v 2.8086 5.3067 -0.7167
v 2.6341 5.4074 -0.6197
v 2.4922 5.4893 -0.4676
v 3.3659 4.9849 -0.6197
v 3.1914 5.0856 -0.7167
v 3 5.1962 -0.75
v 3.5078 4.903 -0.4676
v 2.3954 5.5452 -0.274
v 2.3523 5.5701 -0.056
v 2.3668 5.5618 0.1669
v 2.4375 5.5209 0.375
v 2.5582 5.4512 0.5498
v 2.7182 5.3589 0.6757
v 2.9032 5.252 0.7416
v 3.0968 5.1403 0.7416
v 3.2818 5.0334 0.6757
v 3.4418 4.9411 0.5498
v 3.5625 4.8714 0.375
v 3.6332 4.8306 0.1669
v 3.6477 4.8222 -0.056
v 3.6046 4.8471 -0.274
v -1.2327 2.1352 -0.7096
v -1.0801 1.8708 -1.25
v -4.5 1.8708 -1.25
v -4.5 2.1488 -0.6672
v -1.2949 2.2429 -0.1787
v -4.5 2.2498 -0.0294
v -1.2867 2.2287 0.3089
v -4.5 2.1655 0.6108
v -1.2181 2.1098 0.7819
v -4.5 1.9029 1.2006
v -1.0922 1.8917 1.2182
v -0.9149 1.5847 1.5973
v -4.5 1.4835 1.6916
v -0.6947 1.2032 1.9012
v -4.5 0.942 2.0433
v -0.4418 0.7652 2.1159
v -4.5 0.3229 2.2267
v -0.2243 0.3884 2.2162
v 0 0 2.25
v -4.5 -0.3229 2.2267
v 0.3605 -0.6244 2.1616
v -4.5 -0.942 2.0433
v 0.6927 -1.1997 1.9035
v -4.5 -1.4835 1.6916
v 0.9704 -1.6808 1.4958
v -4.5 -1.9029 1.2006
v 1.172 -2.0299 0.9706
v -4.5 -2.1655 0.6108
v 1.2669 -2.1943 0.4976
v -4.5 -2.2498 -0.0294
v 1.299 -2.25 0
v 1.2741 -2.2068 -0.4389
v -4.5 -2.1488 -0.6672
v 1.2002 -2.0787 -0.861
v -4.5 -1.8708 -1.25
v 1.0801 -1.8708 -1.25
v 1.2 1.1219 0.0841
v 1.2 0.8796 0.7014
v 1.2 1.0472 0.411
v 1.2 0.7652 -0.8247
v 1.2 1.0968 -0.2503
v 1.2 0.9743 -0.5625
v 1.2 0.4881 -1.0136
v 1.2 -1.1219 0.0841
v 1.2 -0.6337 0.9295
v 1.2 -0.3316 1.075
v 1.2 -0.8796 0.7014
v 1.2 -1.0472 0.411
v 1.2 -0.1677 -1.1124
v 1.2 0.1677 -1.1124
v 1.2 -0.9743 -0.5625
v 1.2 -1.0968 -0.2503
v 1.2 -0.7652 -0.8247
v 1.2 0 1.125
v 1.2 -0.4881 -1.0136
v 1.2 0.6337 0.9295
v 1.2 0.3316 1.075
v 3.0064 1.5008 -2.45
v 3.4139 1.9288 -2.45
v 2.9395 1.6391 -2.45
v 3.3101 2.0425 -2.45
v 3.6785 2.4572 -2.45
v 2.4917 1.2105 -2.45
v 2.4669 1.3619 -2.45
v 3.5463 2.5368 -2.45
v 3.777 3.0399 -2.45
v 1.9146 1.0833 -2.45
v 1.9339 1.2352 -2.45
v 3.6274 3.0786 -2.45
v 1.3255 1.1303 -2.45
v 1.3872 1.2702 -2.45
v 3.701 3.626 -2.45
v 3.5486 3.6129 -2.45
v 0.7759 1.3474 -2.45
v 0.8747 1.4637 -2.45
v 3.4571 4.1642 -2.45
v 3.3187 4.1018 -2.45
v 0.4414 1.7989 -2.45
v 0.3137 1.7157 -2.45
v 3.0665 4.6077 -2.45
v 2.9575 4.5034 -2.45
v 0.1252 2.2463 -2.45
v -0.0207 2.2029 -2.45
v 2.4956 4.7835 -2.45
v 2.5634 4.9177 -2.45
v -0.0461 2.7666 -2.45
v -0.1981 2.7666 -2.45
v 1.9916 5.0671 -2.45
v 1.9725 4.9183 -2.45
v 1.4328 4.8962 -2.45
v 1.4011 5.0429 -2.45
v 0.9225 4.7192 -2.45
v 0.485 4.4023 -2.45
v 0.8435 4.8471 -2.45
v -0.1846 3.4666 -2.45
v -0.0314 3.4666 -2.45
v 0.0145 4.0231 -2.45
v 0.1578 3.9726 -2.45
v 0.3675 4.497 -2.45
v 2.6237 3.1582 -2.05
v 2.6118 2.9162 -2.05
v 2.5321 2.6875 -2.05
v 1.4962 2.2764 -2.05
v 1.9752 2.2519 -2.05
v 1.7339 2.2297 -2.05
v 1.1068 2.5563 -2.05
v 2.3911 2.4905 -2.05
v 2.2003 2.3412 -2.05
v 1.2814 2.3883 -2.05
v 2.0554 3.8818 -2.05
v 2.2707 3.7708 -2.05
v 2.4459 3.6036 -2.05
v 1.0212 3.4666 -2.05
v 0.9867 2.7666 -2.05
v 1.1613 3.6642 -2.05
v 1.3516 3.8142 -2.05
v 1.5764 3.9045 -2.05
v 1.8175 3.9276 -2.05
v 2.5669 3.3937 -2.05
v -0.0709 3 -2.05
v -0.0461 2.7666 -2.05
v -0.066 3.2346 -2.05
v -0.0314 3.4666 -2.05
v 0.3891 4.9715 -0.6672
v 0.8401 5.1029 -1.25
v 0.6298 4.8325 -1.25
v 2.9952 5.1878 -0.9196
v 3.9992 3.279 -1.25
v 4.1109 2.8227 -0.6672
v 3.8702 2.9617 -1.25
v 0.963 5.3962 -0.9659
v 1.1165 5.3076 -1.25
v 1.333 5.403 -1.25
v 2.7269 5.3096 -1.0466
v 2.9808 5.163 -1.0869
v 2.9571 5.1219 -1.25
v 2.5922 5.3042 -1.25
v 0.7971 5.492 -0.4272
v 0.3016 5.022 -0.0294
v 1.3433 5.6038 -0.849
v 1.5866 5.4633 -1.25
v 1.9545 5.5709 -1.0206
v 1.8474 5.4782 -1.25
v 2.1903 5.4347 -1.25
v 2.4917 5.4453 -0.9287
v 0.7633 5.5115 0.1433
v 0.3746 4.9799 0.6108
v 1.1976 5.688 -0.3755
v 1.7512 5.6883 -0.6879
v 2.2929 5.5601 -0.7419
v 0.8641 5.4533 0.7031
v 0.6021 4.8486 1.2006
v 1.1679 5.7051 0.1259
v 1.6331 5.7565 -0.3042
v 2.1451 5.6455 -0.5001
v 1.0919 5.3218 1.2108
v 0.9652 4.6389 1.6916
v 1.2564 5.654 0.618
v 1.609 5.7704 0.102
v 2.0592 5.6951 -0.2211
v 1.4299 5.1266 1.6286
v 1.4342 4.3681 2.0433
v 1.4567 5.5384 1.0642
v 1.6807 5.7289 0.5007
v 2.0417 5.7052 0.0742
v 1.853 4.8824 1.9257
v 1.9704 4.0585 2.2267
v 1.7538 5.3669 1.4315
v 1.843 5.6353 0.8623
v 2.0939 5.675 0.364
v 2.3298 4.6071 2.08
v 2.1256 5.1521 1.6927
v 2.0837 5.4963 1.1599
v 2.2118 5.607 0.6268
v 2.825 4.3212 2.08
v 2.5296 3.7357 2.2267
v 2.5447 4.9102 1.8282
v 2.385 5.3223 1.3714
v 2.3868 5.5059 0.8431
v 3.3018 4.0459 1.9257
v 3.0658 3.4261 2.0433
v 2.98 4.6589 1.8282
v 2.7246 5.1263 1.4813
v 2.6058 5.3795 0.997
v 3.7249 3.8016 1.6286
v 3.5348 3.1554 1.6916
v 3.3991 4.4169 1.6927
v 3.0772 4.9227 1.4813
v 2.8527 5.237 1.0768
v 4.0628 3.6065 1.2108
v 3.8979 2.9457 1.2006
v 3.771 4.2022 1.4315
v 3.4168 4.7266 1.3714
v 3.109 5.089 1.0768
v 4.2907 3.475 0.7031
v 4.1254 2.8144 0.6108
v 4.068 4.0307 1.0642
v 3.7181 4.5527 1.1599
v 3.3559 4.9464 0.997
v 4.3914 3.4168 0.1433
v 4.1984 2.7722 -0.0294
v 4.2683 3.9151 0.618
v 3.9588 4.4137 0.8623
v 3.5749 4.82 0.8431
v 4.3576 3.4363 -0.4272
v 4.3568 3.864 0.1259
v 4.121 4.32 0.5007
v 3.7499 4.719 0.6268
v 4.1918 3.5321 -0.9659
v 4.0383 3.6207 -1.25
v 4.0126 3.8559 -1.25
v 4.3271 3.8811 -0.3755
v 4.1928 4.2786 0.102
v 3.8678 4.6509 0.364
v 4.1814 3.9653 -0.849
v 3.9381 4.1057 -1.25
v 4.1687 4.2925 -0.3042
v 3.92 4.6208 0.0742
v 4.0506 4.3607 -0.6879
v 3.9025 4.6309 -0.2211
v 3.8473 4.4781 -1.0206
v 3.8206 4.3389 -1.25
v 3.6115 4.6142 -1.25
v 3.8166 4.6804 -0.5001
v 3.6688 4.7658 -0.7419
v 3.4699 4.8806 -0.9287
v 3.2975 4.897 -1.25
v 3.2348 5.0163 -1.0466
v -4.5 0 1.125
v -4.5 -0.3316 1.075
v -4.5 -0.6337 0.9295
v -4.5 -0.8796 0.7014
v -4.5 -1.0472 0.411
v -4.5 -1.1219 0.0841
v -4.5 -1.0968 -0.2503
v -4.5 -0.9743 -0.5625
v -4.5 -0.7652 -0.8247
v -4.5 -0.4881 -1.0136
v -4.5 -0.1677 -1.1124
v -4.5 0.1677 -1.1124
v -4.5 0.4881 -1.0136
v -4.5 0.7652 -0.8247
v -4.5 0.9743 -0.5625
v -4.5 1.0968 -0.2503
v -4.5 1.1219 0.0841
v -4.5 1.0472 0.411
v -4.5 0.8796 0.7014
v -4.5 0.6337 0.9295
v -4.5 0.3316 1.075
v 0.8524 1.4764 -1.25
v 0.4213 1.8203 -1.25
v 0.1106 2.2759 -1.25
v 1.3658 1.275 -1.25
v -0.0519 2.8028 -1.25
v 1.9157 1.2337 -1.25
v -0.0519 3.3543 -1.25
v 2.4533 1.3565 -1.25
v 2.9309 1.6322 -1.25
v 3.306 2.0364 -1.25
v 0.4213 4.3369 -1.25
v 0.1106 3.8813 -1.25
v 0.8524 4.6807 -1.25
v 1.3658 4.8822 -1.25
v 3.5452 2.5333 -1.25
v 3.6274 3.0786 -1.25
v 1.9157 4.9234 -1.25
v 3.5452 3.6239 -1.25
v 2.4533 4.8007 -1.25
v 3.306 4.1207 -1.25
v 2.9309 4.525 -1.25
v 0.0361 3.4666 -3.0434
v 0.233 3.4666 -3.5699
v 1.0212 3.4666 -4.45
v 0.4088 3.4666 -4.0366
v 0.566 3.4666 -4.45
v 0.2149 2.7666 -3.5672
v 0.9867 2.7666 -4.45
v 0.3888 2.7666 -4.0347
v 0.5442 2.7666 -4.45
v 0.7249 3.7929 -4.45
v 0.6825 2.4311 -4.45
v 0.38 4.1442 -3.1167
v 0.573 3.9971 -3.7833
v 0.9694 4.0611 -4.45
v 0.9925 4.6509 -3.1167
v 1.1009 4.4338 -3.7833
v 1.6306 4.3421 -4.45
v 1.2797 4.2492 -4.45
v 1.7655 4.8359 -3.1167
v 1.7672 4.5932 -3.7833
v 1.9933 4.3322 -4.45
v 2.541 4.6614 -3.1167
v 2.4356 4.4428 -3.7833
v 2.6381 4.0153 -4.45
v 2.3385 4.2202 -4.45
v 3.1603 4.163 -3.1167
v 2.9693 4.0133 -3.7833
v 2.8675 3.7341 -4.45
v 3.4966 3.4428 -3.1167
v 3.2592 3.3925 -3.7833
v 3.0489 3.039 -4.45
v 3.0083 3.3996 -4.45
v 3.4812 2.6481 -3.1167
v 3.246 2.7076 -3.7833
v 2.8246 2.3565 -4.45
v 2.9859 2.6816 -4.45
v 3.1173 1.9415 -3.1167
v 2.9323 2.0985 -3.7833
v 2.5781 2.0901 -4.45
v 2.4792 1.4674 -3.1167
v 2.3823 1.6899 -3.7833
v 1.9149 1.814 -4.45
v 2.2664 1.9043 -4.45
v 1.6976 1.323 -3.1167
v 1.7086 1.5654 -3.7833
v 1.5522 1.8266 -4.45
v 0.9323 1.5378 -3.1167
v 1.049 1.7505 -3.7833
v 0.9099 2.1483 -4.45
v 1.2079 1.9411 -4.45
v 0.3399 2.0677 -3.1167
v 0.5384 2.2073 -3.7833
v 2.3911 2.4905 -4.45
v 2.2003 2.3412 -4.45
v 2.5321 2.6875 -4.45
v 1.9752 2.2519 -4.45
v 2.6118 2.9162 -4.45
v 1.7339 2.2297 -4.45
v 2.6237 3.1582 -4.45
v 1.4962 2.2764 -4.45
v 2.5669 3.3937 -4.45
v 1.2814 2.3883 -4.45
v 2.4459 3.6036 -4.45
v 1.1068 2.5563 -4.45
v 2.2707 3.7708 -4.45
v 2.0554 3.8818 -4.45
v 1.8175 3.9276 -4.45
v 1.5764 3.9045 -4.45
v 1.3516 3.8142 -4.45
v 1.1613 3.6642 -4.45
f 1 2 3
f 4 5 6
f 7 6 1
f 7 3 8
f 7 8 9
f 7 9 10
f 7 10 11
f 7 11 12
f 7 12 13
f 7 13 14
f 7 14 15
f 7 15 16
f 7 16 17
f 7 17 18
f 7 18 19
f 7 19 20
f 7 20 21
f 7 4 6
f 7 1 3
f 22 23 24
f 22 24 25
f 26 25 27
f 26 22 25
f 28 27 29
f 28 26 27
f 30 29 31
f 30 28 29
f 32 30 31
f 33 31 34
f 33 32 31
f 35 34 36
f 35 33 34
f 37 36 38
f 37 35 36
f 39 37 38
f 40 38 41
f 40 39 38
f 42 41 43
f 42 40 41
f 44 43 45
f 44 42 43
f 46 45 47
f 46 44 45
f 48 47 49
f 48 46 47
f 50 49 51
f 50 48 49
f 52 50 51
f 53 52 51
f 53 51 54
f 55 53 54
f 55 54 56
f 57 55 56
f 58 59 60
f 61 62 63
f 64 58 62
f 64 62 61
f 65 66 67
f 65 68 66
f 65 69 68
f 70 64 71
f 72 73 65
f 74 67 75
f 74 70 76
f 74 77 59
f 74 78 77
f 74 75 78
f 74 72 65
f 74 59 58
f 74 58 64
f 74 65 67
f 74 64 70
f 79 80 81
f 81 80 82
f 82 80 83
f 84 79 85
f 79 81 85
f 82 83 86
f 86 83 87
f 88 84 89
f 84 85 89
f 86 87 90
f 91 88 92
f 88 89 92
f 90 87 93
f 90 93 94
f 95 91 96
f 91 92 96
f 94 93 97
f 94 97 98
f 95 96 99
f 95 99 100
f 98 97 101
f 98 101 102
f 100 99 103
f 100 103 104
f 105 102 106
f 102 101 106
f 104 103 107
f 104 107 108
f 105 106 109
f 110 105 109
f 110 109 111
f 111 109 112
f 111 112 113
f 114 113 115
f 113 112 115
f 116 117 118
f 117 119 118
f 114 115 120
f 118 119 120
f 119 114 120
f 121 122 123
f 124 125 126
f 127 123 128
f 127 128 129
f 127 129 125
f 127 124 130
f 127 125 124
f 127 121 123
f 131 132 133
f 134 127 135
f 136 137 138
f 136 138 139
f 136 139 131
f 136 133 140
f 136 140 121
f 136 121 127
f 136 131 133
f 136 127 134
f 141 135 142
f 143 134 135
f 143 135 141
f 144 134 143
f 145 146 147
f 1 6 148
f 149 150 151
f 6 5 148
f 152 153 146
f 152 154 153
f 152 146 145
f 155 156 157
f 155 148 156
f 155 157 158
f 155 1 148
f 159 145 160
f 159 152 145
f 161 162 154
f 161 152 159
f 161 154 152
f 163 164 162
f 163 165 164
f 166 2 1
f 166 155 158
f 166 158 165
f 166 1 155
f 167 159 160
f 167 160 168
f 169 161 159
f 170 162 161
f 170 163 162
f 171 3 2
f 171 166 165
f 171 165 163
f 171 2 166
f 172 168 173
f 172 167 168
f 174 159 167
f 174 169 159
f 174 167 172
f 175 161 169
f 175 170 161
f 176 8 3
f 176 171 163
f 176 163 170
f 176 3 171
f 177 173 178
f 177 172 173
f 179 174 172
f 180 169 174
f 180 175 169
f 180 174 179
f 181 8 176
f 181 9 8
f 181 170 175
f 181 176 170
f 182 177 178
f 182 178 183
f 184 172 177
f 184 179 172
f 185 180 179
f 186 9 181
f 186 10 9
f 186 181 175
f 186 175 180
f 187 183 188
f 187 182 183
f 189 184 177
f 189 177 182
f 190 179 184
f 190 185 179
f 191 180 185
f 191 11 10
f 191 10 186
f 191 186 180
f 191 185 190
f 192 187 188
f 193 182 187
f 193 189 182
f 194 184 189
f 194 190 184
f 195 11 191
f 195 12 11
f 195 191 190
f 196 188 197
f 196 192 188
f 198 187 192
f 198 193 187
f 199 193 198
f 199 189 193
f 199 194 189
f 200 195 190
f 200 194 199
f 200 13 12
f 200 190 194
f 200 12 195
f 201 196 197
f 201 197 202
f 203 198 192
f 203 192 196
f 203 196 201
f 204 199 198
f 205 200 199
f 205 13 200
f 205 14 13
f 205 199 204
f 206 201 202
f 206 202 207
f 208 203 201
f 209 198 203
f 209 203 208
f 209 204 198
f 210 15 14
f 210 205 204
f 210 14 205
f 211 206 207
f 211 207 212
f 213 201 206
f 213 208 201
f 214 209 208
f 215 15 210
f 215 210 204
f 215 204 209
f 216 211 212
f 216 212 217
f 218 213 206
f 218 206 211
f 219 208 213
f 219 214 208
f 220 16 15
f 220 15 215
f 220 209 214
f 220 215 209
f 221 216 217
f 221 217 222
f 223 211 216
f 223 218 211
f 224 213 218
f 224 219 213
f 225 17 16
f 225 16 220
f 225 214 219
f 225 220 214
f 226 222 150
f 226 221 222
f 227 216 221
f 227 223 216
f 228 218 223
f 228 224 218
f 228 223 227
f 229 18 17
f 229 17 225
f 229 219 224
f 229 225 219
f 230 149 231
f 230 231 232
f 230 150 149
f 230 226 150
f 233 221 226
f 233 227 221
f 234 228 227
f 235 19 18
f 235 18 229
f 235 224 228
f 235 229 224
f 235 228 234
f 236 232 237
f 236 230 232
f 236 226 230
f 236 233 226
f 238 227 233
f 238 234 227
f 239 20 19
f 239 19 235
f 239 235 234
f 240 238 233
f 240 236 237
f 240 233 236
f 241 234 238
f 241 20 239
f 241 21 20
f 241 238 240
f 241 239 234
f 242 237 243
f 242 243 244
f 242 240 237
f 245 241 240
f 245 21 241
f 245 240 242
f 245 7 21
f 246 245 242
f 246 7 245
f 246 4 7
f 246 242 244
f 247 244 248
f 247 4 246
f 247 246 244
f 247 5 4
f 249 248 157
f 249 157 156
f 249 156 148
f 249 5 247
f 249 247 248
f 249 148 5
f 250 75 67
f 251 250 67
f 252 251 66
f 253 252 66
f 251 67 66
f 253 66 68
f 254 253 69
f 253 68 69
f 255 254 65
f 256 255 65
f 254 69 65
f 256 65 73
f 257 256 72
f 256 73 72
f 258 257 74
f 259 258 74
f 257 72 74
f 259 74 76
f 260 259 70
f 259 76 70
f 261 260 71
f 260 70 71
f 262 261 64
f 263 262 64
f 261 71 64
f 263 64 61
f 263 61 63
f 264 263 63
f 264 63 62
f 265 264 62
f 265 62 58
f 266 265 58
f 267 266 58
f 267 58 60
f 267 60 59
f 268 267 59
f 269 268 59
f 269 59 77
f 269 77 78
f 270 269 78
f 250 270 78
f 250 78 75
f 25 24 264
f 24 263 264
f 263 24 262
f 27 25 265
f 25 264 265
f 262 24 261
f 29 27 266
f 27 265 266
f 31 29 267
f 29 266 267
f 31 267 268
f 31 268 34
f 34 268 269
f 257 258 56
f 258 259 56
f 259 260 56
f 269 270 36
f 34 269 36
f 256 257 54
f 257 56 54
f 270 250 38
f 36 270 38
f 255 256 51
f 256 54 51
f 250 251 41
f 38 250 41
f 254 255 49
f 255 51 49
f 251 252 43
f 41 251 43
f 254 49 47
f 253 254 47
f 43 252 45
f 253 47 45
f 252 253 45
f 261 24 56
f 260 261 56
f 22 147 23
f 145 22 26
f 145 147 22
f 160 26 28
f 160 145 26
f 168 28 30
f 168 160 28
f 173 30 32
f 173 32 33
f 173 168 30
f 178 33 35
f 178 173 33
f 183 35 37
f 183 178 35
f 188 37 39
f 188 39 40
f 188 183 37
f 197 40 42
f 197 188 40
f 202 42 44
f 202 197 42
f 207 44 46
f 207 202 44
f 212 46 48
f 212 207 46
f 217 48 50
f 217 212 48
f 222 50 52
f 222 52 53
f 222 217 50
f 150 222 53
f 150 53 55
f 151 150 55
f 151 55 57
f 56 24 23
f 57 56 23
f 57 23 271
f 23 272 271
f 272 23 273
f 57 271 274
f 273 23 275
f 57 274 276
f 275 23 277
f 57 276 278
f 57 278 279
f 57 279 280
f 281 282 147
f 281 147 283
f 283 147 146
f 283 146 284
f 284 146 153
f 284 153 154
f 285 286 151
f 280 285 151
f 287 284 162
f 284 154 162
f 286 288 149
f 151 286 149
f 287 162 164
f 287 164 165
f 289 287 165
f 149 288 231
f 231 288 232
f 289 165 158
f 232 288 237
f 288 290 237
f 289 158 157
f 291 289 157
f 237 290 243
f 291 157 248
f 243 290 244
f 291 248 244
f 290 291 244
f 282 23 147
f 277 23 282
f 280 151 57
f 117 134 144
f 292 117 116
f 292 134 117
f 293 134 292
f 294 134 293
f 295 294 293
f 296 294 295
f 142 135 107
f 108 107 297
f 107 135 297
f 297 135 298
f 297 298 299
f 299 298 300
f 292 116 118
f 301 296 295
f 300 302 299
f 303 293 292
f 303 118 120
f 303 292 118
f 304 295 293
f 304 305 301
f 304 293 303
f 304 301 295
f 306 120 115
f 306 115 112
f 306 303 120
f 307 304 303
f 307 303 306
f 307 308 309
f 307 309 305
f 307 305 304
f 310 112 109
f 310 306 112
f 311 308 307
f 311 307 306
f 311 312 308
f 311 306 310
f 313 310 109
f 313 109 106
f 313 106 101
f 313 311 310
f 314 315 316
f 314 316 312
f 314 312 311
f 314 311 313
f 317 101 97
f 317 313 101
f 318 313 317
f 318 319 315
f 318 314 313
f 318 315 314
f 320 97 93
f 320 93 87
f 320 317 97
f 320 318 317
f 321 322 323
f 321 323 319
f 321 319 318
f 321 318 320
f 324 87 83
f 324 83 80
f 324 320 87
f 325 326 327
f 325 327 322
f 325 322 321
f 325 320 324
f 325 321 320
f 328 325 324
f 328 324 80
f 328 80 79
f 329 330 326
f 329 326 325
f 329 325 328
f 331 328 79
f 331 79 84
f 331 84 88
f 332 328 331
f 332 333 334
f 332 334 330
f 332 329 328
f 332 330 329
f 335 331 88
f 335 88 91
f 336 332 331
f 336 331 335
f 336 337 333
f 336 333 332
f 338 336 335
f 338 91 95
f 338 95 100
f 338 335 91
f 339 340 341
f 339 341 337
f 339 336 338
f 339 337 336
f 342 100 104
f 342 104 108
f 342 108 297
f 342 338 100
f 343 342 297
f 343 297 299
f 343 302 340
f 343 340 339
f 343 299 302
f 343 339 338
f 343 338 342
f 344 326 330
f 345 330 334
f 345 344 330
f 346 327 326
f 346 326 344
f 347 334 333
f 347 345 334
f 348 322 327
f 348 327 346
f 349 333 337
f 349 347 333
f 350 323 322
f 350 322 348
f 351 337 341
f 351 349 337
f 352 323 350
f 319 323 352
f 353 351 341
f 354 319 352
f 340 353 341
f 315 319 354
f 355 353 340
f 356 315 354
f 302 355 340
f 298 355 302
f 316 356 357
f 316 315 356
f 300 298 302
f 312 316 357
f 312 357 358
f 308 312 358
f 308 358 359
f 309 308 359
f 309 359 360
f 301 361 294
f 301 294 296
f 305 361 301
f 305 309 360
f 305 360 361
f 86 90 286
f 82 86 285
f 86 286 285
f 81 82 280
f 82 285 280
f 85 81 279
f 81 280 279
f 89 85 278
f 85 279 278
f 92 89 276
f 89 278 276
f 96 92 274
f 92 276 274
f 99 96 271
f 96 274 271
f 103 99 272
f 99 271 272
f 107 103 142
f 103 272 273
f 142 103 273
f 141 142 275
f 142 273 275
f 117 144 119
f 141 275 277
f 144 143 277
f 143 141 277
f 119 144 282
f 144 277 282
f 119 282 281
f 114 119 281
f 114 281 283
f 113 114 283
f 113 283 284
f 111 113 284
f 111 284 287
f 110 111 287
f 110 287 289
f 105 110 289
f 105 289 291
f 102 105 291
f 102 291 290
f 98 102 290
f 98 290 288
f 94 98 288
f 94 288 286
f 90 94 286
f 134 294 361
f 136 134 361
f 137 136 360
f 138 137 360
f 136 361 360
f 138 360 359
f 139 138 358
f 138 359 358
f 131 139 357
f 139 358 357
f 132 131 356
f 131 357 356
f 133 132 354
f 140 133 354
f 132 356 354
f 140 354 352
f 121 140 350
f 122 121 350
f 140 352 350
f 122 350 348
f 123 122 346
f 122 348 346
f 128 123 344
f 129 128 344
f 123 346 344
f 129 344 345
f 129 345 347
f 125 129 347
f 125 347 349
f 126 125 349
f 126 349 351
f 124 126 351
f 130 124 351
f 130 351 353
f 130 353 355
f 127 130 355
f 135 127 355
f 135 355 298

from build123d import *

# Parameters (mm, degrees)
SKETCH3_R           = 2.25
FILLET2_R           = 1.5
SKETCH4_R           = 1.125
SKETCH6_W           = 9.297020352
SKETCH6_H           = 8.256436423
CUT_EXTRUDE1_DEPTH  = 3
SKETCH7_R           = 1.85
BOSS_EXTRUDE2_DEPTH = 1.2
SKETCH8_R           = 2
BOSS_EXTRUDE3_DEPTH = 2
BOSS_EXTRUDE3_TAPER = 20
SKETCH9_R           = 0.85
CUT_EXTRUDE2_DEPTH  = 2.4
SKETCH10_W          = 1.535398486
SKETCH10_H          = 0.7
CUT_EXTRUDE3_DEPTH  = 2.4


with BuildPart() as part:
    # Sweep1: sweep along a path in Sketch2
    with BuildLine(Plane.XY) as sweep1_path:
        Line((-4.5, 0), (0, 0))
        Line((0, 0), (3, 5.196152423))
    # Sketch3 → Sweep1 (sweep)
    with BuildSketch(Plane(origin=(-4.5, 0, 0), x_dir=(0, 0, -1), z_dir=(1, 0, 0))):
        Circle(SKETCH3_R)
    sweep(path=sweep1_path.line, transition=Transition.RIGHT)

    # Fillet2
    fillet2_edges = [part.edges().sort_by_distance(p)[0] for p in [
        (3, 5.196152423, 2.25),
    ]]
    fillet(fillet2_edges, radius=FILLET2_R)

    # Cut-Sweep1: sweep along a path in Sketch5
    with BuildLine(Plane.XY) as cut_sweep1_path:
        Line((-4.5, 0), (1.2, 0))
    # Sketch4 → Cut-Sweep1 (sweep, cut)
    with BuildSketch(Plane.ZY.offset(4.5)):
        Circle(SKETCH4_R)
    sweep(path=cut_sweep1_path.line, mode=Mode.SUBTRACT)

    # Sketch6 → Cut-Extrude1 (cut)
    with BuildSketch(Plane.XY.offset(-1.25)):
        with Locations((-0.019421036, 1.725207659)):
            Rectangle(SKETCH6_W, SKETCH6_H)
    extrude(amount=-CUT_EXTRUDE1_DEPTH, mode=Mode.SUBTRACT)

    # Sketch7 → Boss-Extrude2 (add)
    with BuildSketch(Plane(origin=(0, 0, -1.25), x_dir=(-1, 0, 0), z_dir=(0, 0, -1))):
        with Locations(Location((-1.777414459, 3.078572149, 0), (0, 0, 180))):
            Circle(SKETCH7_R)
    extrude(amount=BOSS_EXTRUDE2_DEPTH)

    # Sketch8 → Boss-Extrude3 (add)
    with BuildSketch(Plane(origin=(0, 0, -2.45), x_dir=(-1, 0, 0), z_dir=(0, 0, -1))):
        with Locations((-1.777414459, 3.078572149)):
            Circle(SKETCH8_R)
    extrude(amount=BOSS_EXTRUDE3_DEPTH, taper=BOSS_EXTRUDE3_TAPER)

    # Sketch9 → Cut-Extrude2 (cut)
    with BuildSketch(Plane(origin=(0, 0, -4.45), x_dir=(-1, 0, 0), z_dir=(0, 0, -1))):
        with Locations((-1.777414459, 3.078572149)):
            Circle(SKETCH9_R)
    extrude(amount=-CUT_EXTRUDE2_DEPTH, mode=Mode.SUBTRACT)

    # Sketch10 → Cut-Extrude3 (cut)
    with BuildSketch(Plane(origin=(0, 0, -4.45), x_dir=(-1, 0, 0), z_dir=(0, 0, -1))):
        with Locations((-0.333609148, 3.11663504)):
            Rectangle(SKETCH10_W, SKETCH10_H)
    extrude(amount=-CUT_EXTRUDE3_DEPTH, mode=Mode.SUBTRACT)


solid = part.part
